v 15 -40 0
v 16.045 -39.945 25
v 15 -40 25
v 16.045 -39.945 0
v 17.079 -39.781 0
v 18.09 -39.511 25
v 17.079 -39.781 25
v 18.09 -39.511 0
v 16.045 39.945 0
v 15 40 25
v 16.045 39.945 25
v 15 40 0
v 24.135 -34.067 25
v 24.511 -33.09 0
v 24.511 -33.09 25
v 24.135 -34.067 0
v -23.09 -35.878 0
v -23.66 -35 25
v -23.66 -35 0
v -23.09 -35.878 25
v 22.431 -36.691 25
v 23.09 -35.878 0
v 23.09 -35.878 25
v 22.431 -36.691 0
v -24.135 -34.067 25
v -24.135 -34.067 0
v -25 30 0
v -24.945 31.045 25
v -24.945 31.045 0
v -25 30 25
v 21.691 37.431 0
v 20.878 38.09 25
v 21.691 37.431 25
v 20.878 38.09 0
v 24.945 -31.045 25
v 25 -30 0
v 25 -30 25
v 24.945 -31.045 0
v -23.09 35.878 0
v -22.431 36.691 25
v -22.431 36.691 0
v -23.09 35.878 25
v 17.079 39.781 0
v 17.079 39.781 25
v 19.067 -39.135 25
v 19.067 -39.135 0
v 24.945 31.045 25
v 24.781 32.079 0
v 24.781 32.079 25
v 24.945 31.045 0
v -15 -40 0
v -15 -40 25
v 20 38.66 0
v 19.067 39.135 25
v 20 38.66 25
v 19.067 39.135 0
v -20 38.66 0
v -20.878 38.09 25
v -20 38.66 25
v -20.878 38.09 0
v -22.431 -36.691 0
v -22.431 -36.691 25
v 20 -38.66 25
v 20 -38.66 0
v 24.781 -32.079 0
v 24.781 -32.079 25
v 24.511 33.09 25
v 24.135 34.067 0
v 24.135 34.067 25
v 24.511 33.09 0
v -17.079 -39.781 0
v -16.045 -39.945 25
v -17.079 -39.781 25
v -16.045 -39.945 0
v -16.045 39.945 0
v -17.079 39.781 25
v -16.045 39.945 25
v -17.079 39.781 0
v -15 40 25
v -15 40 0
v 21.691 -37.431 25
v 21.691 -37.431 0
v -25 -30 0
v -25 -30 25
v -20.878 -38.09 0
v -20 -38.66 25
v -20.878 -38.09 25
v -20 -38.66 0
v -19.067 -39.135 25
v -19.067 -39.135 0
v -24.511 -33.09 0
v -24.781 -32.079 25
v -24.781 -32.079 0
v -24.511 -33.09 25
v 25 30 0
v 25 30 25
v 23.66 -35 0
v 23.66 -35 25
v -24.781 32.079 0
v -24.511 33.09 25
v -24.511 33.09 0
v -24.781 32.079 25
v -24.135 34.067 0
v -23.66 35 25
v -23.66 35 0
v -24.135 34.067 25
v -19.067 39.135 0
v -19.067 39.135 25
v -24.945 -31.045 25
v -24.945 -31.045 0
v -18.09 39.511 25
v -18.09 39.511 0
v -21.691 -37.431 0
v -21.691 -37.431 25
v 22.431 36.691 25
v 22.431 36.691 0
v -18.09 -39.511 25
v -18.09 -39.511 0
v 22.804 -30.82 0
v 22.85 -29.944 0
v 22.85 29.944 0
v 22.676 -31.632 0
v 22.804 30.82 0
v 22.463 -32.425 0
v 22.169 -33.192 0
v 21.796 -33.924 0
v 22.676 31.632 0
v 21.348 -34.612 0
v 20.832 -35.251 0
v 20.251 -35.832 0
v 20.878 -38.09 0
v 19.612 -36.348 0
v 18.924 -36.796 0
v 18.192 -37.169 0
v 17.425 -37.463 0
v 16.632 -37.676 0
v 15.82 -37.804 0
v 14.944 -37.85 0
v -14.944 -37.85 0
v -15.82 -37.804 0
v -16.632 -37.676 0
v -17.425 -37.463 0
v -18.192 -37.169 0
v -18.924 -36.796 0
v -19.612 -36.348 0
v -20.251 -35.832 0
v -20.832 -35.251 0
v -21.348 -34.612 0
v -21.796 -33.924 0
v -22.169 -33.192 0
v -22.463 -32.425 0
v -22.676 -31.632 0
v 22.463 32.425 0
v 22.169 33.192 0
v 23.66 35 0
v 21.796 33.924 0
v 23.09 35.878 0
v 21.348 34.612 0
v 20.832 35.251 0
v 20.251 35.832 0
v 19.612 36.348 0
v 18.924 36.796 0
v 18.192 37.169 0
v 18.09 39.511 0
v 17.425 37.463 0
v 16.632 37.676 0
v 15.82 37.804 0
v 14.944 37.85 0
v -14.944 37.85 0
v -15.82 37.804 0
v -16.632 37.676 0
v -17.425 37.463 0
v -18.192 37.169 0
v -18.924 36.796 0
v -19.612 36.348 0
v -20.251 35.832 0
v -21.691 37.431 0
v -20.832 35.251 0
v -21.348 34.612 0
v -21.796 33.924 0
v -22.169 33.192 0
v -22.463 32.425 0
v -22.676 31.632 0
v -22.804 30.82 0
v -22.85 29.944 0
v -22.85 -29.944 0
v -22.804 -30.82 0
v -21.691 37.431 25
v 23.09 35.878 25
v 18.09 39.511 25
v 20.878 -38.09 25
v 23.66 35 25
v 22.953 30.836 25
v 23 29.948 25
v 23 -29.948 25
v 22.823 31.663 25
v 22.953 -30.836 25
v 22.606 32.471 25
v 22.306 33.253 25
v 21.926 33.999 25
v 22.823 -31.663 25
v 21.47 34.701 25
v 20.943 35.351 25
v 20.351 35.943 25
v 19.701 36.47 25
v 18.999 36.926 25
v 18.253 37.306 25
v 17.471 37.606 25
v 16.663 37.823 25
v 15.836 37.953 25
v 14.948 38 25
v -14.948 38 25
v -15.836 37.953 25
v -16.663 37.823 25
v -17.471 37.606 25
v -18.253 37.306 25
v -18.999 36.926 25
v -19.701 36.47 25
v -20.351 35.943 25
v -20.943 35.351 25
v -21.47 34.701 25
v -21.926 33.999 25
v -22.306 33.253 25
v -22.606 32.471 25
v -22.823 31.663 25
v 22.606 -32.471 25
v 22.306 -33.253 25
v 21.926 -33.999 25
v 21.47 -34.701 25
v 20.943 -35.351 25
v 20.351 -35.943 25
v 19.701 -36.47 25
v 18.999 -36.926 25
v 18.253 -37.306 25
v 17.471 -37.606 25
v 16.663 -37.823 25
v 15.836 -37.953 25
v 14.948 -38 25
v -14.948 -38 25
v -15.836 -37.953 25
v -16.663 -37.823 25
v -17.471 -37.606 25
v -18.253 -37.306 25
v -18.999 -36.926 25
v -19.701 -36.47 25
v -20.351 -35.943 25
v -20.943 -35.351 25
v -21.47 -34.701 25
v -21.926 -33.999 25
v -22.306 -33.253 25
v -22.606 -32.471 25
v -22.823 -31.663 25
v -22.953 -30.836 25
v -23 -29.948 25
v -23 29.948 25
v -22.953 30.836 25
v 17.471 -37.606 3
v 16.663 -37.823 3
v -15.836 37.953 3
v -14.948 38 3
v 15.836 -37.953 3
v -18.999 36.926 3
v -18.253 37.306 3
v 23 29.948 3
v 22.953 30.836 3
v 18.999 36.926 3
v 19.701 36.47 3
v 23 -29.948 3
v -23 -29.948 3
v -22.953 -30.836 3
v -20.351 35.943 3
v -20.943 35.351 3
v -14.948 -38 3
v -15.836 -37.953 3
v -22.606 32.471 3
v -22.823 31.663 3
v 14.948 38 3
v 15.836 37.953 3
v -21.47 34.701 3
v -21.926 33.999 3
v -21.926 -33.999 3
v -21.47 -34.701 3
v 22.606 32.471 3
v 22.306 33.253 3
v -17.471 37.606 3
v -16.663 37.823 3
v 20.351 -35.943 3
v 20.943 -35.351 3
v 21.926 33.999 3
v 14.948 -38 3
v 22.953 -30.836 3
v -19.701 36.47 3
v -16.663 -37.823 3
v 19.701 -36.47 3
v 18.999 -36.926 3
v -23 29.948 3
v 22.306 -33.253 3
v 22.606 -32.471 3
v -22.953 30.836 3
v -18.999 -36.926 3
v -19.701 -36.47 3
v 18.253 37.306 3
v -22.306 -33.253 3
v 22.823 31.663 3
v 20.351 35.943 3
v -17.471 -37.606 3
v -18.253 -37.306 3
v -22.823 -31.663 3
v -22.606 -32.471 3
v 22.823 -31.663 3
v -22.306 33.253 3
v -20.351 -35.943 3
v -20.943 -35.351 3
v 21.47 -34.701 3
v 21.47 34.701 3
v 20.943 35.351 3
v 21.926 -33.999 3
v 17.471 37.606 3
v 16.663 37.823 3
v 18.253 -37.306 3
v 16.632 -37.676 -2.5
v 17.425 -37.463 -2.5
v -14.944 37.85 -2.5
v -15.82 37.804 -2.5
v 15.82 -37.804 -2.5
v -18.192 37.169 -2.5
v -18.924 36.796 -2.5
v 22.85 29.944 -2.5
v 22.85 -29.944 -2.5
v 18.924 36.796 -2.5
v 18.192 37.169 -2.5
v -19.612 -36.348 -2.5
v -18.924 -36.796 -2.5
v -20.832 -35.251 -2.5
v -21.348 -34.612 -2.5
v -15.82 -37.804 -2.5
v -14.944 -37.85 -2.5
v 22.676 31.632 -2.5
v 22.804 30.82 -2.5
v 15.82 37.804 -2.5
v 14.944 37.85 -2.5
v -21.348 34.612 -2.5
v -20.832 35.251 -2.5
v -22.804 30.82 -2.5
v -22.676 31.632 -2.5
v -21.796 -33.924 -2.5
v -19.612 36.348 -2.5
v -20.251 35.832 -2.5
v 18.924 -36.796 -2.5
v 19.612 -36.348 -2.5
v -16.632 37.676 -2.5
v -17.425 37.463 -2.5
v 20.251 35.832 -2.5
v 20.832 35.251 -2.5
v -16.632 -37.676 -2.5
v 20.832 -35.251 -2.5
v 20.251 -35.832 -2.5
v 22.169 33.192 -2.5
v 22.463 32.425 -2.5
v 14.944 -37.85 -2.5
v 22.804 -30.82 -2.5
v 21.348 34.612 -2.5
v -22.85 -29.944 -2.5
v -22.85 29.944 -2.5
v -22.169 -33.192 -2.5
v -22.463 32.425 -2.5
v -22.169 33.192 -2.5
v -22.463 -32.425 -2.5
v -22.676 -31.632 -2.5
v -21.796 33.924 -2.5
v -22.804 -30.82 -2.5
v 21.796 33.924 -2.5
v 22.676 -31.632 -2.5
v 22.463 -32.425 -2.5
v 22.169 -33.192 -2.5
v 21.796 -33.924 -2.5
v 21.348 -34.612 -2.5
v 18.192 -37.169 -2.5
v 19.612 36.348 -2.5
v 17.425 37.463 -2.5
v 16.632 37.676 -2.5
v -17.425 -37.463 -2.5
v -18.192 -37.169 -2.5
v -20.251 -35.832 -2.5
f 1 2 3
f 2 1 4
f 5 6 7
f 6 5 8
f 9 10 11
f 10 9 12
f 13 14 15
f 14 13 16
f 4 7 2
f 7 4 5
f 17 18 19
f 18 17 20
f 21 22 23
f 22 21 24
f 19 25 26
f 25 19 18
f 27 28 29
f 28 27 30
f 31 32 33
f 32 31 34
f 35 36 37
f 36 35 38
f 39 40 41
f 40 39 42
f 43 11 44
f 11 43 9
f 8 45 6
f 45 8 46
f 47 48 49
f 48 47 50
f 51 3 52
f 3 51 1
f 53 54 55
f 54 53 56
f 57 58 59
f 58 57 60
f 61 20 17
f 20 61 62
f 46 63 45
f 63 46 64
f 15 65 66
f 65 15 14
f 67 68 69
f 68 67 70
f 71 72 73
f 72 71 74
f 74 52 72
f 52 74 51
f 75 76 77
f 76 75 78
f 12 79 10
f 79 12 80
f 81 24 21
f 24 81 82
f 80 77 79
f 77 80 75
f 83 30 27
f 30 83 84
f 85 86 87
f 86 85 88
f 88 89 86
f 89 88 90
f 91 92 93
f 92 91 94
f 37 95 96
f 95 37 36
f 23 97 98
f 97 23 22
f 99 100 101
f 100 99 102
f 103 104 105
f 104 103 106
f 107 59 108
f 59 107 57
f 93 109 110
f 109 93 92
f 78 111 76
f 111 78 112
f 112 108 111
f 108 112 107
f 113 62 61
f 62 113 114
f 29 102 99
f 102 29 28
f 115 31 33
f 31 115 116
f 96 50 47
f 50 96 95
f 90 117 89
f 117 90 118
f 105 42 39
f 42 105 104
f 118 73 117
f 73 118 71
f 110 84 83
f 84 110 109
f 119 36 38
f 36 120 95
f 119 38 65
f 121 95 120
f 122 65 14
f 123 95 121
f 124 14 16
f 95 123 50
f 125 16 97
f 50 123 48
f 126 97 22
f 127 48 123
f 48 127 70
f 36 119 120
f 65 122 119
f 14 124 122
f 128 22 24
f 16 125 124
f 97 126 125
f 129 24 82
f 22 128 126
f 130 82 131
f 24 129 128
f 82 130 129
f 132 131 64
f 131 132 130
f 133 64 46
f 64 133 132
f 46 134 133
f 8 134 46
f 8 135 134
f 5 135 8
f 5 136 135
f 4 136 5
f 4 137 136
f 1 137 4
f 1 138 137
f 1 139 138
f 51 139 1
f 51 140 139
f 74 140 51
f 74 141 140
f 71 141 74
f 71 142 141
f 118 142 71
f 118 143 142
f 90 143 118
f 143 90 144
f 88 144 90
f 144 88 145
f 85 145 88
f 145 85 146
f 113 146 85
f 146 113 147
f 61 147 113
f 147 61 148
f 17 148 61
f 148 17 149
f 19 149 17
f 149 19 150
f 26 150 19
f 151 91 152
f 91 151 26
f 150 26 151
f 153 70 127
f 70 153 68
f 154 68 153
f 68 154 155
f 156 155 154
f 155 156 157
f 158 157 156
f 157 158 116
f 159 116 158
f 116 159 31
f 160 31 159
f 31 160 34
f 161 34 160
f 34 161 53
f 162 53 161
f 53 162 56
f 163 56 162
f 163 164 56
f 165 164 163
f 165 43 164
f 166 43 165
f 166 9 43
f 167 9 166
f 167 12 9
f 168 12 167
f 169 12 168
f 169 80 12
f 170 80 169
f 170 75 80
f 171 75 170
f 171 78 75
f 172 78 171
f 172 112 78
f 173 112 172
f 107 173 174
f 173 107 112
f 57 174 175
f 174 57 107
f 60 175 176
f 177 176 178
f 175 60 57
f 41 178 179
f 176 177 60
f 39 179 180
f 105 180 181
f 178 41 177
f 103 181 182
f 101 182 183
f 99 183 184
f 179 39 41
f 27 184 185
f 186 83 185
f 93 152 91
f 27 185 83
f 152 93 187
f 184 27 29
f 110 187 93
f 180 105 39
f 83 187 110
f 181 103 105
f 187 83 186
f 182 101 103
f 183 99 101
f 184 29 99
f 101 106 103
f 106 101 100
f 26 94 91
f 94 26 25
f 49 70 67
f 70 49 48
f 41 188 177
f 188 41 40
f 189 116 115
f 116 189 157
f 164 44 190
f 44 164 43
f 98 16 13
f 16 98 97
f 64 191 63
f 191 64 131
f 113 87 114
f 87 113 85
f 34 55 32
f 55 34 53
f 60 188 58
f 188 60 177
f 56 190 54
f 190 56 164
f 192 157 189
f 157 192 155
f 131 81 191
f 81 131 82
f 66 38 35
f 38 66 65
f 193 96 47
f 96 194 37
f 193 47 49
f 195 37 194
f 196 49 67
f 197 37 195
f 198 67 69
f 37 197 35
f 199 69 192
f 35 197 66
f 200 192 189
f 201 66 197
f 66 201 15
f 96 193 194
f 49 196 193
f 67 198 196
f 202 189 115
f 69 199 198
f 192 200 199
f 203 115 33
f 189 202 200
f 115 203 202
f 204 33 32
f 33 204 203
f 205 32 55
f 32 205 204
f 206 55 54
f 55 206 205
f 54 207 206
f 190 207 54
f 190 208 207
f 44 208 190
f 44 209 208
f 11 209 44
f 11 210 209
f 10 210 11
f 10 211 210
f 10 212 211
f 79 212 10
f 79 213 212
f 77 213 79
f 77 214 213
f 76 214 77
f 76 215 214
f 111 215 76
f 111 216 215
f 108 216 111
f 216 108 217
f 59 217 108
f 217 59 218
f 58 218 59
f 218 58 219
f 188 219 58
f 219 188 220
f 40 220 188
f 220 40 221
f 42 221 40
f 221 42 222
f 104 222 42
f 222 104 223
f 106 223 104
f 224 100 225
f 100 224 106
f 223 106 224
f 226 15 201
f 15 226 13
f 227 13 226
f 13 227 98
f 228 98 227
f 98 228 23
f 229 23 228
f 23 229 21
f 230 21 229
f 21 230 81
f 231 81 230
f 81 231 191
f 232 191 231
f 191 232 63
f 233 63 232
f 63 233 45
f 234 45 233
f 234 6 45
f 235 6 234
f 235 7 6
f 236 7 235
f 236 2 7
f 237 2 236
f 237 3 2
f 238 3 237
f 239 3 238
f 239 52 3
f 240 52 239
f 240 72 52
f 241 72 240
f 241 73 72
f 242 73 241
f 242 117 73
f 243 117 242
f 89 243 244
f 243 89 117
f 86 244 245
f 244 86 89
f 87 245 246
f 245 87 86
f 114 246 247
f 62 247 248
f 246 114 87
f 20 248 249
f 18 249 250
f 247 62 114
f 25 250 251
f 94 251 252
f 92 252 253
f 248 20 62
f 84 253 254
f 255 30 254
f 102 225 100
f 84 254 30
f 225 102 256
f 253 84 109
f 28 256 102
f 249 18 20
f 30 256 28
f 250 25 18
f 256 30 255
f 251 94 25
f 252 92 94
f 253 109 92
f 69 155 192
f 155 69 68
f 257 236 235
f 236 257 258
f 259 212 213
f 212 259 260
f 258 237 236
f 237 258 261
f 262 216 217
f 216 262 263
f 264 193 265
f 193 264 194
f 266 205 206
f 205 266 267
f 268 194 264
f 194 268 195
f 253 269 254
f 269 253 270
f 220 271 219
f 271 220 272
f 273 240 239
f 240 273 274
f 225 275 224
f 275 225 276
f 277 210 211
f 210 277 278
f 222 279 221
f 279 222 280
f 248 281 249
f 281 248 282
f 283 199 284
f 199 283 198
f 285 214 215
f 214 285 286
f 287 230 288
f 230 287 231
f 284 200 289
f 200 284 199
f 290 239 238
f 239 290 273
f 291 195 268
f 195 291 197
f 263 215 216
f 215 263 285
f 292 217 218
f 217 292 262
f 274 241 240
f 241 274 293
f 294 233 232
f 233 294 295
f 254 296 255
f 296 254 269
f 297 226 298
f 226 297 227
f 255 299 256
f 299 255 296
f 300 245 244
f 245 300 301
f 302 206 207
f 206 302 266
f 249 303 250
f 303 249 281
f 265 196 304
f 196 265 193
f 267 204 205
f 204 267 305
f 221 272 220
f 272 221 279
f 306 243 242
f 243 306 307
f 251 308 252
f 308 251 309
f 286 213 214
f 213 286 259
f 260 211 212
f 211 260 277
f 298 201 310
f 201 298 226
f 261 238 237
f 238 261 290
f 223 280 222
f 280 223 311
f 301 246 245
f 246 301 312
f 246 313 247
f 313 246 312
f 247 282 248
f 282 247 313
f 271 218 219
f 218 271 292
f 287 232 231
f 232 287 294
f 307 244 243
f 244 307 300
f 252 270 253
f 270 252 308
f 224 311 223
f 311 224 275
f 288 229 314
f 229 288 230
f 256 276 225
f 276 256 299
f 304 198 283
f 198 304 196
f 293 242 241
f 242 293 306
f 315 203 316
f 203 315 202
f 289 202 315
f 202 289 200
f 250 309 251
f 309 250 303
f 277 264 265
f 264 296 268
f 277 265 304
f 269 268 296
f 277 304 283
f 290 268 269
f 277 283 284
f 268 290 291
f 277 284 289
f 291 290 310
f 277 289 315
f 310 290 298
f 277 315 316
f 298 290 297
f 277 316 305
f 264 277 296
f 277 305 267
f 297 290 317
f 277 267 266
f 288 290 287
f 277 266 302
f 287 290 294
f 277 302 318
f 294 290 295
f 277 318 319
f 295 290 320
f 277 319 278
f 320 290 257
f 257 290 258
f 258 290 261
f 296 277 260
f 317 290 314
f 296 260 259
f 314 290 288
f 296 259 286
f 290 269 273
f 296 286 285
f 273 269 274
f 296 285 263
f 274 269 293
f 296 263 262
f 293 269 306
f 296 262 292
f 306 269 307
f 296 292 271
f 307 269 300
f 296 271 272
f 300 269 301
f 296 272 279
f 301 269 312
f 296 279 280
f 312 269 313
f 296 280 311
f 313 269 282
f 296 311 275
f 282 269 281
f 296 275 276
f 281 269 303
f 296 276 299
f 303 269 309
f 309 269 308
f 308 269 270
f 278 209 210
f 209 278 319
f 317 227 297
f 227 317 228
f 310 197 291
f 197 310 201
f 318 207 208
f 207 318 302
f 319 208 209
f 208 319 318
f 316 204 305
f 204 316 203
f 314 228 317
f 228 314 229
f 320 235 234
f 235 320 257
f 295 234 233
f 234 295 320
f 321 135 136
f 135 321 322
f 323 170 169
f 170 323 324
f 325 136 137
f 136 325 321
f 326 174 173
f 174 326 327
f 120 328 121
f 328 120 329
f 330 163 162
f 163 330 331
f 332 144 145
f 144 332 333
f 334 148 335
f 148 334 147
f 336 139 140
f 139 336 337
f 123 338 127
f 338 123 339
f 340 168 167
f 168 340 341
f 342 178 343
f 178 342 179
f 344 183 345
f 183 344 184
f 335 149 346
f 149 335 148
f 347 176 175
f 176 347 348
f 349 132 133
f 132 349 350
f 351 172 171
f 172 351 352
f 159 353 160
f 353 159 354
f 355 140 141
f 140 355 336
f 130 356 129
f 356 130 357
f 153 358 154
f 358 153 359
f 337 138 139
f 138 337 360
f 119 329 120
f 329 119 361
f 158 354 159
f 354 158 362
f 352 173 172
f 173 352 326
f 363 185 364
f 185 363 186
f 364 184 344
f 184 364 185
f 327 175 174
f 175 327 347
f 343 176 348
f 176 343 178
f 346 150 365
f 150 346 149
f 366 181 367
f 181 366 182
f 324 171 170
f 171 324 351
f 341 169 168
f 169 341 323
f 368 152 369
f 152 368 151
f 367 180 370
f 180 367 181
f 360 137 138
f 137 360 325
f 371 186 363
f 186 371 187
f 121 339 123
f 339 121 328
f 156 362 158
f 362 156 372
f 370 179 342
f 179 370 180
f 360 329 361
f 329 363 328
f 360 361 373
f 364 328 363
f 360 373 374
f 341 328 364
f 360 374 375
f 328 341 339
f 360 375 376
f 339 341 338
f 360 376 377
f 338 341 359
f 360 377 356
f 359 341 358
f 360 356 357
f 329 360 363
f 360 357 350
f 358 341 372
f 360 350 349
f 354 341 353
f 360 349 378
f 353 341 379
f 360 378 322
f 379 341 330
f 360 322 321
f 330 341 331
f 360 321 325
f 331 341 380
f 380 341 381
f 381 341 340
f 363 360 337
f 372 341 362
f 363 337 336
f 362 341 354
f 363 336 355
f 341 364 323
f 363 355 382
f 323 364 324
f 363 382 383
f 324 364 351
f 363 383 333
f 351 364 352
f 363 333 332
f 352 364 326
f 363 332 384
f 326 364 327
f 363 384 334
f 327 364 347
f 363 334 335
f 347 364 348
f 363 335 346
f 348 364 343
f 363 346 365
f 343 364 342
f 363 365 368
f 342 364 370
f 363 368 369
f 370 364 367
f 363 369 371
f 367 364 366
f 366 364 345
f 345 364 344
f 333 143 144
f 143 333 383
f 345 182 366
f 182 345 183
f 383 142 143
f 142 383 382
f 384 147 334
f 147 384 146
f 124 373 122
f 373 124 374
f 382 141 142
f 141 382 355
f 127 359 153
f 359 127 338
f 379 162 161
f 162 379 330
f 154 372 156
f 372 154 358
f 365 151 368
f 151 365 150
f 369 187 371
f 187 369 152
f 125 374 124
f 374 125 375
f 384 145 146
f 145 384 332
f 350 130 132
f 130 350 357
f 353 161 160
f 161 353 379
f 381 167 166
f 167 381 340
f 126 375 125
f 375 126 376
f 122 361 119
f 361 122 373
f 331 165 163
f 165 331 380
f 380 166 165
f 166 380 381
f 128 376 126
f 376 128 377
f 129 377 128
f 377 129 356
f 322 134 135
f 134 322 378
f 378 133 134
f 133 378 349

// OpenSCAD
// Screw Boat
// Stackable open-top tray. The foot below the floor drops into the
// cavity of another boat below it, registering the stack laterally.

$fn = 60;

// Outer footprint (XY) and overall boat height (Z, excludes the foot
// that hangs below the floor).
BOAT_LENGTH    = 50;   // mm, X
BOAT_WIDTH     = 80;   // mm, Y
BOAT_HEIGHT    = 25;   // mm, Z
CORNER_RADIUS  = 10;    // mm, footprint corner rounding (parameter)

// Material thicknesses
FLOOR_THICKNESS = 3;   // mm
WALL_THICKNESS  = 2;   // mm

// Stacking foot below the floor
FOOT_HEIGHT     = 2.5;   // mm, Z extent below the floor
FOOT_CLEARANCE  = 0.3; // mm, gap between foot and the cavity it drops
                       // into, applied in both X and Y (half on each
                       // side after centering).

// Rounded-rectangle 2D footprint, centered on origin.
module rounded_rect(length, width, radius) {
    offset(r = radius)
    square([length - 2 * radius, width - 2 * radius], center = true);
}

// 2D outer footprint of the boat.
module outer_footprint() {
    rounded_rect(BOAT_LENGTH, BOAT_WIDTH, CORNER_RADIUS);
}

// 2D cavity footprint: outer inset by WALL_THICKNESS per side.
module cavity_footprint() {
    offset(r = -WALL_THICKNESS) outer_footprint();
}

// 2D foot footprint: inset an additional FOOT_CLEARANCE / 2 per side
// beyond the cavity, so the foot is FOOT_CLEARANCE smaller than the
// cavity in both X and Y.
module foot_footprint() {
    offset(r = -WALL_THICKNESS - FOOT_CLEARANCE / 2) outer_footprint();
}

// Solid outer block (rounded prism) before the cavity is removed.
module boat_shell() {
    linear_extrude(height = BOAT_HEIGHT)
    outer_footprint();
}

// Open-top cavity carved out above the floor.
module cavity_cutout() {
    translate([0, 0, FLOOR_THICKNESS])
    linear_extrude(height = BOAT_HEIGHT - FLOOR_THICKNESS + 0.01)
    cavity_footprint();
}

// Stacking foot below the floor.
module stacking_foot() {
    translate([0, 0, -FOOT_HEIGHT])
    linear_extrude(height = FOOT_HEIGHT + 0.01)
    foot_footprint();
}

module screw_boat() {
    union() {
        difference() {
            boat_shell();
            cavity_cutout();
        }
        stacking_foot();
    }
}

screw_boat();
